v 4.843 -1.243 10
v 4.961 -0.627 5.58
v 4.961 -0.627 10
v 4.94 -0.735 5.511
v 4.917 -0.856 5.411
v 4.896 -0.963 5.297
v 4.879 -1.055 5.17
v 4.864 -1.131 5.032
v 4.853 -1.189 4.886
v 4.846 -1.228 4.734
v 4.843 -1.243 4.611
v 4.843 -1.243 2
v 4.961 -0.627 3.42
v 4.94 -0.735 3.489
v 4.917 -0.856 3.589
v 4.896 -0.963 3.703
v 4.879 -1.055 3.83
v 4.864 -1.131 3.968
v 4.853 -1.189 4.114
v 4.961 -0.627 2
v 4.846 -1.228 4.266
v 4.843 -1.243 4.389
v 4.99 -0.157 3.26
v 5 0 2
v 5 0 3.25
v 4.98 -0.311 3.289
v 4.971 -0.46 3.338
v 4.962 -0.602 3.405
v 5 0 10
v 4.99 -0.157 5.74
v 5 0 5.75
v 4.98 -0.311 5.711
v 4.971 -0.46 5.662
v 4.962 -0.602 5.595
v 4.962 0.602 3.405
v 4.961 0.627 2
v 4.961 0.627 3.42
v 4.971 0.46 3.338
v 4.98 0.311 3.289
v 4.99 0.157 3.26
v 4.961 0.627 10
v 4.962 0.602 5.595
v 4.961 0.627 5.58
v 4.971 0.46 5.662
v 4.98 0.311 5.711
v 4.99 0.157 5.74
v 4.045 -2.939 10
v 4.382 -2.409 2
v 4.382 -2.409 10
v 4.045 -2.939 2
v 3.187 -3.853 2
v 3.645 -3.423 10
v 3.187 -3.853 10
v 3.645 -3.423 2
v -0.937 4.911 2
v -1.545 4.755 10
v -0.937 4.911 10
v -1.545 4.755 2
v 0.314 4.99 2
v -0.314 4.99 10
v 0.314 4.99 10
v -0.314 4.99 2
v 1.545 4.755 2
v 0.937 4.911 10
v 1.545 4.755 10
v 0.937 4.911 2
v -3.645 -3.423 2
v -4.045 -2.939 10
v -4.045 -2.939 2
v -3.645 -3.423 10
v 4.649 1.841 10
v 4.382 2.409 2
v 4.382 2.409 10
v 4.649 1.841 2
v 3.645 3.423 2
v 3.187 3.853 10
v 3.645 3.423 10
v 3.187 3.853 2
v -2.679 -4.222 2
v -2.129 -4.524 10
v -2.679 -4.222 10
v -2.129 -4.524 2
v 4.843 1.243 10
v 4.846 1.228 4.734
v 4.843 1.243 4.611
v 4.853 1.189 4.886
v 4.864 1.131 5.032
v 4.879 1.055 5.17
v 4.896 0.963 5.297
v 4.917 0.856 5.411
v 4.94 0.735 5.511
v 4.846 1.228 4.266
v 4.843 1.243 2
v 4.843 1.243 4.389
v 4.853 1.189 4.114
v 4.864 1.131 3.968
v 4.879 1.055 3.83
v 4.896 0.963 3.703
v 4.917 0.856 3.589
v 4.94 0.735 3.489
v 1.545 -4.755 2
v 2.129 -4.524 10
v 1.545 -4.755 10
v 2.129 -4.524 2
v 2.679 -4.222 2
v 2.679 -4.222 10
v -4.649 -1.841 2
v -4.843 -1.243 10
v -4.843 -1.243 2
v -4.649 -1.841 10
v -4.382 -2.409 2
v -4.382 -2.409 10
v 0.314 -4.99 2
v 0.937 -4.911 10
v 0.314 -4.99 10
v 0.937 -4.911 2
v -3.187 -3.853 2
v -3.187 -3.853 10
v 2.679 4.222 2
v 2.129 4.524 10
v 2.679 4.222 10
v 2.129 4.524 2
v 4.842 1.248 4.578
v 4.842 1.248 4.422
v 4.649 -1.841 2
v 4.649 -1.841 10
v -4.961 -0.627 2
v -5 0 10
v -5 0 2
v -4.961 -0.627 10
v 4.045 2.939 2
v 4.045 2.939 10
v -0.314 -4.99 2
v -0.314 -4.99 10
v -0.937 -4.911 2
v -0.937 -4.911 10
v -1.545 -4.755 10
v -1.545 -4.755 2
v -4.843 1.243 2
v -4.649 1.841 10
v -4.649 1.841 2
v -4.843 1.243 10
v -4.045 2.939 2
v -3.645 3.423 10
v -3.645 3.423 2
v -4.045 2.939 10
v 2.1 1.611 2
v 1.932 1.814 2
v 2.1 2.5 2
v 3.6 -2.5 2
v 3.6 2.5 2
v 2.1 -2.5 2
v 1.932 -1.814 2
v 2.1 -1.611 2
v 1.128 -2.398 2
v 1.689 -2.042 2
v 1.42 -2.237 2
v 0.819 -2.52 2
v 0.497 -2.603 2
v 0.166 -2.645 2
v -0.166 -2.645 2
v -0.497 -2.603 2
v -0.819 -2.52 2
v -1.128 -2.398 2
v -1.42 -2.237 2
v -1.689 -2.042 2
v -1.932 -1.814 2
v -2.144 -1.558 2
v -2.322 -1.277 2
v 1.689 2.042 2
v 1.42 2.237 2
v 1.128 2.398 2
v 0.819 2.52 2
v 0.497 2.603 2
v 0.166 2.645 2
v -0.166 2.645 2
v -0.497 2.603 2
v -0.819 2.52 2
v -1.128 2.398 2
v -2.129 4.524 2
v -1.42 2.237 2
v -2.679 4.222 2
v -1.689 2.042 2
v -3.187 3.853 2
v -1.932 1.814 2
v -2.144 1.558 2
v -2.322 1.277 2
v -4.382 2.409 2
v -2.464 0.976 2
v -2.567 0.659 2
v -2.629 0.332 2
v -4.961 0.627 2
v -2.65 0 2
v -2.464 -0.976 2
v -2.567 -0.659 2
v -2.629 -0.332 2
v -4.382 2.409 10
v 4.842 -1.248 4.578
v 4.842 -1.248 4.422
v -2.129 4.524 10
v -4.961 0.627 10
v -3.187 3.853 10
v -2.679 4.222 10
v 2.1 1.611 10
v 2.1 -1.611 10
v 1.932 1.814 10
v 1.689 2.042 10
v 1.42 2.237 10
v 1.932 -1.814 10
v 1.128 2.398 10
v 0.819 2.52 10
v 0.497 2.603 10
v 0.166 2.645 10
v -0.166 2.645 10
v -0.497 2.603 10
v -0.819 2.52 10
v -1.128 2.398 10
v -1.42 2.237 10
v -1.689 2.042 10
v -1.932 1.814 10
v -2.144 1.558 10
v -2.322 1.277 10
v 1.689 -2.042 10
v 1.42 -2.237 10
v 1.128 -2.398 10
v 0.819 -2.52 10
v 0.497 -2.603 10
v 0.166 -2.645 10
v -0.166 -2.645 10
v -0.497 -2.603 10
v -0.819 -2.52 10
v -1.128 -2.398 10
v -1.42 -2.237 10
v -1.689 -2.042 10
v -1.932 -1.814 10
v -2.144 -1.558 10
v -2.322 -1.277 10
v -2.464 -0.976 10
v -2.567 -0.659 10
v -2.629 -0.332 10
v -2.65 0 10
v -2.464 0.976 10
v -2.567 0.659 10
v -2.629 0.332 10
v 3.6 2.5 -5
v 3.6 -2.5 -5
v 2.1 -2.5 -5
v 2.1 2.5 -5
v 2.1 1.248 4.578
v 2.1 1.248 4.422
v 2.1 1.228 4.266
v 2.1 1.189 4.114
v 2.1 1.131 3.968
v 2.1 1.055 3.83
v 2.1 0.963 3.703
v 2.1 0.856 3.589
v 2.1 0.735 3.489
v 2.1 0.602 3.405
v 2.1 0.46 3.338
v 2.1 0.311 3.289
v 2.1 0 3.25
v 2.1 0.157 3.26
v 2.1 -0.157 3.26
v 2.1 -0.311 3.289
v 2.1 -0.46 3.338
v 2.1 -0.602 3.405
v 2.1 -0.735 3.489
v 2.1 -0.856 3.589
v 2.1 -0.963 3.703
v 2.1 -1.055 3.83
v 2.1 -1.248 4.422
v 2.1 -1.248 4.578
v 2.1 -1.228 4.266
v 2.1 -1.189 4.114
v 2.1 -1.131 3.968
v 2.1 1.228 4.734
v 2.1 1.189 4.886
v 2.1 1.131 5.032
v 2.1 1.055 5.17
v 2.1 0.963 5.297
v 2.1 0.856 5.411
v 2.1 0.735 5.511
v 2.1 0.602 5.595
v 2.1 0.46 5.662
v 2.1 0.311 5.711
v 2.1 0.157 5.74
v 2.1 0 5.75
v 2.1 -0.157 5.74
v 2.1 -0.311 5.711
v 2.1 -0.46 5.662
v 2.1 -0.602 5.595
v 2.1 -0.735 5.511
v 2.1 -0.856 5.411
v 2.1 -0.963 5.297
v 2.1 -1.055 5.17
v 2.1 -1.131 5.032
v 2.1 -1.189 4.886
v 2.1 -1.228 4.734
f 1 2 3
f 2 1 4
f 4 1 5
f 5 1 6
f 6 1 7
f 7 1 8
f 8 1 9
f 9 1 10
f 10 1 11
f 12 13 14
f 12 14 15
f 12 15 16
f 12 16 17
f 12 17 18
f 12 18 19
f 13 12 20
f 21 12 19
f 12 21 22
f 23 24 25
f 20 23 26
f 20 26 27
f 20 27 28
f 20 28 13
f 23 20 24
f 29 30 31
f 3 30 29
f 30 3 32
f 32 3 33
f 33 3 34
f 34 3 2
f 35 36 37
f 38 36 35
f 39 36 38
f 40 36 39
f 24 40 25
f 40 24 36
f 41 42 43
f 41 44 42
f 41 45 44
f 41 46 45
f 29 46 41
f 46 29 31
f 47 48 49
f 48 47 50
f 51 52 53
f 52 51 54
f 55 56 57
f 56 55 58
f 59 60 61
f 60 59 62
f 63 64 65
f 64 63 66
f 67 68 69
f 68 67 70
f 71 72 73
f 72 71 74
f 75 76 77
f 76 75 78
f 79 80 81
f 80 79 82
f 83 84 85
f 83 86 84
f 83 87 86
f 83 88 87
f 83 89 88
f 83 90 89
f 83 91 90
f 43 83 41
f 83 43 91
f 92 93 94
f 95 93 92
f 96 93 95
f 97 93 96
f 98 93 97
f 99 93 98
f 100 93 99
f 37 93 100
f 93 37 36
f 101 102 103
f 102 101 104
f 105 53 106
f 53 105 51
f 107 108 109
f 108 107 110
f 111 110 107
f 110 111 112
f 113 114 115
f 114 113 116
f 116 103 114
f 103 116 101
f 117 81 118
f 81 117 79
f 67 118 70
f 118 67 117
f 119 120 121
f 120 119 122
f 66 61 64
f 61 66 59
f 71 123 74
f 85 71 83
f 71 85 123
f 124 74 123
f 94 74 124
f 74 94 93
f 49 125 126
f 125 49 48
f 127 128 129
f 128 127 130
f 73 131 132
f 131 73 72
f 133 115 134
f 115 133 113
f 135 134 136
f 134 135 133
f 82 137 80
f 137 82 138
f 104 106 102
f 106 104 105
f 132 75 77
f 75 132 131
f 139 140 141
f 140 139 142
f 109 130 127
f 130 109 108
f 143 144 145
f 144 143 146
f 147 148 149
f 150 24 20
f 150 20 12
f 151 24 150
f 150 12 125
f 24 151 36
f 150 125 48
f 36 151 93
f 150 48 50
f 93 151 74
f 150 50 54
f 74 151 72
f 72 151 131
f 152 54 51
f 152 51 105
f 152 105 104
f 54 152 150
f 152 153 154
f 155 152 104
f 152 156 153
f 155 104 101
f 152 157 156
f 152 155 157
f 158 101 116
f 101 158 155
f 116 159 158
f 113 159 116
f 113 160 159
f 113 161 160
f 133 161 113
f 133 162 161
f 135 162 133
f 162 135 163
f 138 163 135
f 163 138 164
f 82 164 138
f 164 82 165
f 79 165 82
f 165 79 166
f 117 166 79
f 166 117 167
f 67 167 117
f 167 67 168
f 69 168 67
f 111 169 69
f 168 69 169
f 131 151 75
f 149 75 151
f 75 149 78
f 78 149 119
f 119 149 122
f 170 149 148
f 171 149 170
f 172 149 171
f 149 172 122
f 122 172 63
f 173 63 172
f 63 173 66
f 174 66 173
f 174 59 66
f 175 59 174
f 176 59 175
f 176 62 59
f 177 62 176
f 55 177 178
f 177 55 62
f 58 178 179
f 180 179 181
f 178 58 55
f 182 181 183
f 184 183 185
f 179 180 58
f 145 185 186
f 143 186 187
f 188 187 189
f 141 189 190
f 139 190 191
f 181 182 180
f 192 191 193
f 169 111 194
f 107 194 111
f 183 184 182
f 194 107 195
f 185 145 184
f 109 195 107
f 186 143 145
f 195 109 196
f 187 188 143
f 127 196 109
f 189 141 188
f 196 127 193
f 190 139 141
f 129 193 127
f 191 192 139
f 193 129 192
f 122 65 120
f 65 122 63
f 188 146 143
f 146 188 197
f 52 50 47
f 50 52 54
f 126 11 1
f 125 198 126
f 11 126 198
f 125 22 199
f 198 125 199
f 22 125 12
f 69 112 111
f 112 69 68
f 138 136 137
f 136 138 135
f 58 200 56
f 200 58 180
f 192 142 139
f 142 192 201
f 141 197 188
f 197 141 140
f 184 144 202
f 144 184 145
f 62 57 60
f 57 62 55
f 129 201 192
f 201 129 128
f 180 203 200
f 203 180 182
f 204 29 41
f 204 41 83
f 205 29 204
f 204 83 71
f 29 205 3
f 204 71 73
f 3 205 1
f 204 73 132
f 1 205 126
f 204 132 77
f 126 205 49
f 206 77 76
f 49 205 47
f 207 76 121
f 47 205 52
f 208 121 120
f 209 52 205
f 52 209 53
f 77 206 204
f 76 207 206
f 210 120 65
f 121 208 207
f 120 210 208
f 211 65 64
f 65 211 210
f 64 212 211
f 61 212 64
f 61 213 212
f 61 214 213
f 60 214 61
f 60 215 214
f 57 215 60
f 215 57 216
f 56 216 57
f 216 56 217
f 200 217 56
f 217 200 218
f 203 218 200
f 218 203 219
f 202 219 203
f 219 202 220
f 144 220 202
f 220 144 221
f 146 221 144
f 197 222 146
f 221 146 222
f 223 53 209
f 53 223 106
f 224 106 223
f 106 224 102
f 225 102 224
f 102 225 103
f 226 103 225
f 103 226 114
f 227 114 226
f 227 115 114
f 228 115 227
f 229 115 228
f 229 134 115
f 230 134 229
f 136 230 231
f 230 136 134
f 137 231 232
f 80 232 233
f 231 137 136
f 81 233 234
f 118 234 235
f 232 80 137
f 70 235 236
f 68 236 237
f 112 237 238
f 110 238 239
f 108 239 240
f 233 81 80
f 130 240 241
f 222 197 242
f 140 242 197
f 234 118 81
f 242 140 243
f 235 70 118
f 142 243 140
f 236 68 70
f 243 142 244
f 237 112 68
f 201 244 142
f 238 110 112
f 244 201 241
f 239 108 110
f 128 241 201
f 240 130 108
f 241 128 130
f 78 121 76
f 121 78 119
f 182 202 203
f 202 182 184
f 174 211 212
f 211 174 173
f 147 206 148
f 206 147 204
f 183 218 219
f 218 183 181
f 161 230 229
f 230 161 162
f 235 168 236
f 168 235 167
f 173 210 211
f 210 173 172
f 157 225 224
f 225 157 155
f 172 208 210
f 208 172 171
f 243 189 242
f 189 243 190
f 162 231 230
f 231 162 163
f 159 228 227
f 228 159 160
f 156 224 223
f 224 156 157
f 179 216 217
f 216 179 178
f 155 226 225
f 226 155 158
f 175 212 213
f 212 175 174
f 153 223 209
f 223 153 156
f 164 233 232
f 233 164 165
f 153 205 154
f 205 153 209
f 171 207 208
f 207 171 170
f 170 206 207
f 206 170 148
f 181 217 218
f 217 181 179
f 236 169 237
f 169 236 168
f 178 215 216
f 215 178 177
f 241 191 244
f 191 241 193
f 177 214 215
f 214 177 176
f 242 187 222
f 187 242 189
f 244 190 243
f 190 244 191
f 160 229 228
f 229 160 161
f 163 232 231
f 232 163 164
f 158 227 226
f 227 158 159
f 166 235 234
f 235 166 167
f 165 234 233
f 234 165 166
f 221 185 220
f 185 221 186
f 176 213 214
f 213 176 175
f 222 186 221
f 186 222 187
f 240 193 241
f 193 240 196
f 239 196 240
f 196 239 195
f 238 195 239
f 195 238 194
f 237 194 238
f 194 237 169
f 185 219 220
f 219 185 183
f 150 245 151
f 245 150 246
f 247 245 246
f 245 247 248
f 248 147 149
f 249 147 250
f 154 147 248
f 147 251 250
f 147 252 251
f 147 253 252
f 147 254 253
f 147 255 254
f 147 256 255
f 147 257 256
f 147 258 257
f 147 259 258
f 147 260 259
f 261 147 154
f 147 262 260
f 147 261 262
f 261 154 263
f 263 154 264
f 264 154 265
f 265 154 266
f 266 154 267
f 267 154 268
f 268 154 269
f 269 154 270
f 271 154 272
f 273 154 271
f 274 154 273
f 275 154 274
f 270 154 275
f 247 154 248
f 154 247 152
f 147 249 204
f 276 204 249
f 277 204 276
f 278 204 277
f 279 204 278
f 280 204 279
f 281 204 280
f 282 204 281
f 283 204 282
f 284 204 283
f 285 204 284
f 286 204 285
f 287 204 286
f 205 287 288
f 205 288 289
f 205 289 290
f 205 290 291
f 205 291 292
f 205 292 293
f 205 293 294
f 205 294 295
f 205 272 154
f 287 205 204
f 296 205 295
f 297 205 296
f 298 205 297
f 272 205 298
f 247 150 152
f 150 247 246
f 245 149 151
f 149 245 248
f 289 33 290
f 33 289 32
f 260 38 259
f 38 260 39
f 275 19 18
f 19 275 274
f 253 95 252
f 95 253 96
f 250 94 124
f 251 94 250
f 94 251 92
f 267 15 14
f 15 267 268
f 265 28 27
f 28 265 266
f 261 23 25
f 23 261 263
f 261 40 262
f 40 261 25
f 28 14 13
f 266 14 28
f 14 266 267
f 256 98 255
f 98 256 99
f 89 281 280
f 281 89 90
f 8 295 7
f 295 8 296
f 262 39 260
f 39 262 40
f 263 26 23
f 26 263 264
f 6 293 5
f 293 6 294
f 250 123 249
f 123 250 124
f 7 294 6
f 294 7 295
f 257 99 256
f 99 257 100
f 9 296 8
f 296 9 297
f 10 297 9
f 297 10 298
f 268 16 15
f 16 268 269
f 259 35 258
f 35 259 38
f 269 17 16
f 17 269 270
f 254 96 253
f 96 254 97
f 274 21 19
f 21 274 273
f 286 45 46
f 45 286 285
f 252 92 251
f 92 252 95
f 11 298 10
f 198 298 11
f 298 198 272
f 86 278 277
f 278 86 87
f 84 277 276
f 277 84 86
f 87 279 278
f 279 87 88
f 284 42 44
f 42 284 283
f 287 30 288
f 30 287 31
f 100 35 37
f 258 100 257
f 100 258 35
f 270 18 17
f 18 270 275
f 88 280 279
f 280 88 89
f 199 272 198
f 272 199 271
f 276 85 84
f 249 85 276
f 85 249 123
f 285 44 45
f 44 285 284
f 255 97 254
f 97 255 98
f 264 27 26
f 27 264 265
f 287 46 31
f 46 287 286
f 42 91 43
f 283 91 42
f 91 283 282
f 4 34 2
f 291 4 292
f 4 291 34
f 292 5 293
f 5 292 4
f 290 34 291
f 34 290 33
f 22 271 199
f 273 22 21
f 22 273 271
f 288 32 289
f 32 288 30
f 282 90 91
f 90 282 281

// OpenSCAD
// file: include.scad
include <globals.scad>;

//////////////////      END SECTION       //////////////////

	module added_pins(){
		difference(){
			union(){
				translate([30/(15/4),obj_leg*leg_length,30/(15/4)]) pin();
				translate([30/(15/4)+14.5,obj_leg*leg_length,30/(15/4)+14]) pin();
			}
			union(){
							translate([30/(15/4)+13.5,obj_leg*leg_length-20,30/(15/4)+5])cube(size=[2,40,15]);
							translate([30/(15/4)+7.5,obj_leg*leg_length-20,30/(15/4)+15])rotate([0,90,0]) cube(size=[2,40,15]);	

							translate([30/(15/4)-1,obj_leg*leg_length-20,30/(15/4)-8])cube(size=[2,40,15]);
							translate([30/(15/4)-10,obj_leg*leg_length-20,30/(15/4)+1])rotate([0,90,0]) cube(size=[2,40,15]);
			}
		}
	}
	module taken_pins() {
		translate([30/(15/4)+14,obj_leg*leg_length-10,30/(15/4)]) mirror_pin();
		translate([30/(15/4),obj_leg*leg_length-10,30/(15/4)+15]) mirror_pin();
	}


//////////////////      OTHER STUFF       //////////////////

	module holes() {
		rotate([0,0,90]) for(y=[0:other_holes])
		translate([obj_leg+y*15,-15.5,7.5]) union() {
			translate([7.5,0,15]) hole_up();
			hole_down();
		}
	}
	module extend_holes() {
	module top(){
		rotate([0,0,90]) for(y=[0:other_holes+1])
		translate([(30/4)+y*15,-15.5,7.5]) union() {
			translate([7.5,0,15]) hole_up();
		}
	}
	module bottom(){
		rotate([0,0,90]) for(y=[0:other_holes+2])
		translate([(30/4)+y*15,-15.5,7.5]) union() {
			hole_down();
		
}
	}
	union(){
		top();
		bottom();
	}
	}

	module hole() {
		union() {
			rotate([90, 90, 0]) cylinder(h=40, d=hole_pin_diameter, center=true);
			translate([0,7.5,0]) sphere(d=hole_ball_size);
			translate([0,-6,0]) sphere(d=hole_ball_size);
		}
	}
	module hole_up() {
		union() {
			rotate([90, 90, 0]) cylinder(h=40, d=hole_pin_diameter, center=true);
			translate([0,7.5,10]) cylinder(h=hole_pin_height, d=hole_pin_diameter, center=true);
			translate([0,-6,10]) cylinder(h=hole_pin_height, d=hole_pin_diameter, center=true);
			translate([0,7.5,0]) sphere(d=hole_ball_size);
			translate([0,-6,0]) sphere(d=hole_ball_size);
		}
	}
	module hole_down() {
		union() {
			rotate([90, 90, 0]) cylinder(h=40, d=hole_pin_diameter, center=true);
			translate([0,7.5,-10]) cylinder(h=hole_pin_height, d=hole_pin_diameter, center=true);
			translate([0,-6,-10]) cylinder(h=hole_pin_height, d=hole_pin_diameter, center=true);
			translate([0,7.5,0]) sphere(d=hole_ball_size);
			translate([0,-6,0]) sphere(d=hole_ball_size);
		}
	}
	module pin() {
		union() {
			rotate([90, 90, 0]) cylinder(h=pin_height, d=pin_diameter, center=true);
			translate([0,7.5,0]) sphere(d=ball_size);
		}
	}

	module mirror_pin() {
		rotate([90, 90, 0]) cylinder(h=hole_pin_height+small_number, d=hole_pin_diameter, center=true);
		translate([0,-(pin_height-(ball_size/2)),0]) sphere(d=ball_size);
	}


//////////////////      SOME RACK AND Z THINGS       //////////////////

module z_holes() {
    rotate([0,-90,0]) for(z=[0:z_hole_number])
    translate([22.5+z*15,16,-12])
        hole();
}

module pin_cuts() {
	union(){
		cube(size=[2,10,40], center=true);
		rotate([0,0,90]) cube(size=[2,10,40], center=true);
	}
}
module pin_uncut() {
	union(){
		rotate([0, 0, 90]) cylinder(h=hole_pin_height, d=hole_pin_diameter, center=true);
		translate([0,0,10]) sphere(d=ball_hole);
	}
}


module pin_out() {
	union(){
		rotate([0, 0, 90]) cylinder(h=pin_height, d=pin_diameter, center=true);
		translate([0,0,10]) sphere(d= ball_size);
	}
}


module pins_z(){
	difference() {
		pin_out();
		pin_cuts();
	}
}
//////////////////      RACK AND SLIDE     ///////////////////

module straight_pins() {
	for(z=[0:((((obj_leg*leg_length)*2)-(obj_leg*2))/3)/14.5]) rotate([-90,0,0]) translate([z*15,30/(15/4),14]) pins_z();
	for(z=[0:((((obj_leg*leg_length)*2)-(obj_leg*2))/3)/14.5]) rotate([-90,0,0]) translate([z*15,30/(15/4)-14,14]) pins_z();
}
module stagger_pins() {
	for(z=[0:((((obj_leg*leg_length)*2)-(obj_leg*2))/3)/14.5]) rotate([-90,0,0]) translate([z*15,30/(15/4),14]) pins_z();
	for(z=[0:((((obj_leg*leg_length)*2)-(obj_leg*2))/3)/14.5]) rotate([-90,0,0]) translate([z*15+7,30/(15/4)-14,14]) pins_z();
}


//////////////////      DOVE TAIL       //////////////////

module male_dovetail(height) {
	dovetail_3d(max_width,min_width,depth,height);
}

module dovetail_3d(max_width=11, min_width=5, depth=5, height=30) {
	linear_extrude(height=height, convexity=2)
		dovetail_2d(max_width,min_width,depth);
}

module dovetail_2d(max_width=11, min_width=5, depth=5) {
	angle=atan((max_width/2-min_width/2)/depth);
	//echo("angle: ", angle);
	polygon(paths=[[0,1,2,3,0]], points=[[-min_width/2,0], [-max_width/2,depth], [max_width/2, depth], [min_width/2,0]]);
}

//bow tie
	module tie_end(height){
				rotate([0,0,0]) translate([0,-0.01,((obj_leg/2)/2)]) male_dovetail(height);
				rotate([0,90,0]) translate([0,-0.01,((obj_leg/2)/2)]) male_dovetail(height);
				rotate([0,180,0]) translate([0,-0.01,((obj_leg/2)/2)]) male_dovetail(height);
				rotate([0,-90,0]) translate([0,-0.01,((obj_leg/2)/2)]) male_dovetail(height);
	}

module bow_support(){
	difference(){
		intersection(){
			translate([-15,0,-15]) cube([30,9,30]);
			scale([1.05,1.05,1.05]) rotate([0,45,0]) tie_end();
		}
		cube([29.2,29.2,29.2], center=true);
	}
}

	module wrap(units){
	for (y = [-1:units-2]) // two iterations, z = -1, z = 1
	{
			translate([15, (y*30)+15, 15]){
			for (r = [0:4]) // two iterations, z = -1, z = 1
			{
				rotate([0,r*90,0]) translate([0,15,15]) rotate([-90,0,0])male_dovetail(height=30);
			}
		}
	}
	}


module nut(h=2.4) {
    hull() {
        cylinder(d = 6.5, h=h, $fn=6);
        translate([0,0,2.4]) cylinder(d = 3.2, h=1.2, $fn=20);
    }
}

module elongated_nut() {
    hull() {
        translate([-2,0,0]) nut();
        translate([2,0,0]) nut();
    }
}

module motor_shaft_hole(h=10) {
    difference() {
        cylinder(d=motor_shaft_hole_dia, h=h);
        translate([0,4.5,h/2]) cube([5,5,h], center=true); 
    }
}

module motor_plate(h=5) {
    difference () {
        translate([0,0,h/2]) cube([motor_side_length,motor_side_length,h], center=true);
            
        translate([0,0,-.5]) cylinder(d=motor_center_hole, h=h+1);

        translate([motor_bolt_hole_distance/2,motor_bolt_hole_distance/2,0]) cylinder(d=bolt_hole_dia, h=h+1, $fn=20);
        translate([-motor_bolt_hole_distance/2,motor_bolt_hole_distance/2,0]) cylinder(d=bolt_hole_dia, h=h+1, $fn=20);
        translate([motor_bolt_hole_distance/2,-motor_bolt_hole_distance/2,0]) cylinder(d=bolt_hole_dia, h=h+1, $fn=20);
        translate([-motor_bolt_hole_distance/2,-motor_bolt_hole_distance/2,0]) cylinder(d=bolt_hole_dia, h=h+1, $fn=20);
    }
}

module rounded_cube(width,depth,height){
    hull(){
        translate([width/2-diameter/2,depth/2-diameter/2,height/2-diameter/2]) sphere(d=diameter);
        translate([width/2-(diameter/2),depth/2-(diameter/2),-height/2+(diameter/2)]) sphere(d=diameter);
        translate([-width/2+diameter/2,depth/2-diameter/2,height/2-diameter/2]) sphere(d=diameter);
        translate([-width/2+(diameter/2),depth/2-(diameter/2),-height/2+(diameter/2)]) sphere(d=diameter);
        
        translate([width/2-diameter/2,-depth/2+diameter/2,height/2-diameter/2]) sphere(d=diameter);
        translate([width/2-(diameter/2),-depth/2+(diameter/2),-height/2+(diameter/2)]) sphere(d=diameter);
        translate([-width/2+diameter/2,-depth/2+diameter/2,height/2-diameter/2]) sphere(d=diameter);
        translate([-width/2+(diameter/2),-depth/2+(diameter/2),-height/2+(diameter/2)]) sphere(d=diameter);
    }
}
//translate([50,50]) nut();
//translate([50,50]) elongated_nut();
//translate([50,47.2]) cube([5.6, 5.6, 2.4]);
// file: globals.scad
/*
Most things in this file is represented as one millimeter, so keep that in mind while changing things.
Some of the setting are not mm but at variables that you can set, such as 2*x=2x and you are setting what x is.
I will try to specify when things are variables and not exact measurements.
*/

// printer slop
slop = 0.15;

obj_leg = 30;
leg_length = 5.5;
small_number = 0.001;
metal_core_rode_global = 5;


///////////////// number of holes /////////////////////
z_hole_number = 8;
other_holes = 8;

///////////////// Pins /////////////////////

//pins that poke out
ball_size = 10;
pin_height = 20;
pin_diameter = 6;


//holes
hole_ball_size = ball_size;
hole_pin_height = pin_height;
hole_pin_diameter = pin_diameter;

///////////////// Z THINGS /////////////////////

berring_slot_width = 7.5;
berring_slot_depth = 6.5;
metal_core_rode = 5;

///////////////// X THINGS /////////////////////

//male dove tails
male_dove_max_width=8;
male_dove_min_width=5;
male_dove_depth=5;
male_dove_height=obj_leg/2;

function scaled_male_dove_max_width() = male_dove_max_width - slop;
function scaled_male_dove_min_width() = male_dove_min_width - slop;
function scaled_male_dove_depth() = male_dove_depth - slop;

//female dove tails, this is found on the y mounts
girl_max_width=11;
girl_min_width=5;
girl_depth=5;
girl_height=obj_leg;


///////////////// Y THINGS /////////////////////
/*
The Y is so normal that all of those global variables at the top should change all of the setting in it, this section is set her incase there are variables set in the future development of this project.
*/

// stepper
motor_side_length = 43.2;
motor_bolt_hole_distance = 31;
motor_center_hole = 23;
motor_shaft_dia = 5;
motor_shaft_hole_dia = 5+2*slop;

// bolts etc.
bolt_hole_dia = 3+2*slop;
bolt_head_hole_dia = 5.8;

m4_bolt_hole_dia = 4+2*slop;
m4_bolt_head_hole_dia = 6.8+2*slop;


m3_nut_side = 5.65;
m3_nut_height = 2.3;
m4_nut_side = 6.85;
m4_nut_height = 3.1;

// threaded rod
lifter_rod_diam = 9.86;
hole_threaded_rod = lifter_rod_diam+2*slop;

// for the extensions
metal_rod_size = 9;
// main file
include <globals.scad>;
include <include.scad>;

//globals
$fn=50;
obj_round = 50;
twist_ratio = 1.62; // based on obj_height = 50 / twist=81
//obj_height = 20;

shaft = motor_shaft_hole_dia;

shaft_len = 22;
shaft_has_flat = true;
shaft_flat_len = 15;

module gear_master(obj_height){

	module rightGear(twist, obj_height) {
		rotate([0, 0, -25]) {
			translate([0, 0, obj_height/4])
			linear_extrude(height = obj_height/2, center = true, twist = twist, convexity = 10)
			    import (file = "small_gear.dxf", layer = "Layer_1");
			circle(r = 1);
		}
	}

    module gearObject(obj_height) {

        module gear(twist, obj_height) {

            union() {
                rightGear(twist, obj_height);
                mirror([0,0,1]) rightGear(twist, obj_height);
            }

        }

        module bone(obj_height) {
            twist=obj_height * twist_ratio;
            difference() {
                gear(twist, obj_height);
                hole(obj_height);
            }
        }
        bone(obj_height);
    }
    
    gearObject(obj_height);
}

module hole(obj_height) {
    cylinder(d=shaft, h=obj_height*2.1, center=true);
}

module bolt_hole(obj_height) {
    hole_pos = shaft_len - shaft_flat_len + shaft_flat_len/2;
    translate([0, 0, obj_height/2-hole_pos]) rotate([0,90,0]) cylinder(d=2.5, h=10);
}

module flat_of_shaft(obj_height) {
    if (shaft_has_flat) {
        translate([5.6/2-0.7,-2.5,-obj_height/2]) cube([1.5,5,obj_height-(shaft_len-shaft_flat_len)], center=false);
    }
}

// original style gear. tune height if so inclined; longer gear seems to cause uneven movement, though...
module gear_v1() {
    difference() {
        union() {
            flat_of_shaft(22);
            gear_master(22);
        }
        #bolt_hole(22);
    }
}

// flat body
module nogear(height) {
    difference() {
        cylinder(d=10, h=height);
        hole(height);
    }
}

// v2 is to be used with the new style rack
module gear_v2() {
    
    mirror([0,1,0]) difference() {
        union() {
            translate([0,0,12/2+(12-20)/2]) nogear(8);
            translate([0,0,6]) flat_of_shaft(22);
            translate([0,0,(12-20)/2]) gear_master(12);
        }
        translate([0,0,9]) #bolt_hole(20);
    }
}
//gear_v1();
gear_v2();
